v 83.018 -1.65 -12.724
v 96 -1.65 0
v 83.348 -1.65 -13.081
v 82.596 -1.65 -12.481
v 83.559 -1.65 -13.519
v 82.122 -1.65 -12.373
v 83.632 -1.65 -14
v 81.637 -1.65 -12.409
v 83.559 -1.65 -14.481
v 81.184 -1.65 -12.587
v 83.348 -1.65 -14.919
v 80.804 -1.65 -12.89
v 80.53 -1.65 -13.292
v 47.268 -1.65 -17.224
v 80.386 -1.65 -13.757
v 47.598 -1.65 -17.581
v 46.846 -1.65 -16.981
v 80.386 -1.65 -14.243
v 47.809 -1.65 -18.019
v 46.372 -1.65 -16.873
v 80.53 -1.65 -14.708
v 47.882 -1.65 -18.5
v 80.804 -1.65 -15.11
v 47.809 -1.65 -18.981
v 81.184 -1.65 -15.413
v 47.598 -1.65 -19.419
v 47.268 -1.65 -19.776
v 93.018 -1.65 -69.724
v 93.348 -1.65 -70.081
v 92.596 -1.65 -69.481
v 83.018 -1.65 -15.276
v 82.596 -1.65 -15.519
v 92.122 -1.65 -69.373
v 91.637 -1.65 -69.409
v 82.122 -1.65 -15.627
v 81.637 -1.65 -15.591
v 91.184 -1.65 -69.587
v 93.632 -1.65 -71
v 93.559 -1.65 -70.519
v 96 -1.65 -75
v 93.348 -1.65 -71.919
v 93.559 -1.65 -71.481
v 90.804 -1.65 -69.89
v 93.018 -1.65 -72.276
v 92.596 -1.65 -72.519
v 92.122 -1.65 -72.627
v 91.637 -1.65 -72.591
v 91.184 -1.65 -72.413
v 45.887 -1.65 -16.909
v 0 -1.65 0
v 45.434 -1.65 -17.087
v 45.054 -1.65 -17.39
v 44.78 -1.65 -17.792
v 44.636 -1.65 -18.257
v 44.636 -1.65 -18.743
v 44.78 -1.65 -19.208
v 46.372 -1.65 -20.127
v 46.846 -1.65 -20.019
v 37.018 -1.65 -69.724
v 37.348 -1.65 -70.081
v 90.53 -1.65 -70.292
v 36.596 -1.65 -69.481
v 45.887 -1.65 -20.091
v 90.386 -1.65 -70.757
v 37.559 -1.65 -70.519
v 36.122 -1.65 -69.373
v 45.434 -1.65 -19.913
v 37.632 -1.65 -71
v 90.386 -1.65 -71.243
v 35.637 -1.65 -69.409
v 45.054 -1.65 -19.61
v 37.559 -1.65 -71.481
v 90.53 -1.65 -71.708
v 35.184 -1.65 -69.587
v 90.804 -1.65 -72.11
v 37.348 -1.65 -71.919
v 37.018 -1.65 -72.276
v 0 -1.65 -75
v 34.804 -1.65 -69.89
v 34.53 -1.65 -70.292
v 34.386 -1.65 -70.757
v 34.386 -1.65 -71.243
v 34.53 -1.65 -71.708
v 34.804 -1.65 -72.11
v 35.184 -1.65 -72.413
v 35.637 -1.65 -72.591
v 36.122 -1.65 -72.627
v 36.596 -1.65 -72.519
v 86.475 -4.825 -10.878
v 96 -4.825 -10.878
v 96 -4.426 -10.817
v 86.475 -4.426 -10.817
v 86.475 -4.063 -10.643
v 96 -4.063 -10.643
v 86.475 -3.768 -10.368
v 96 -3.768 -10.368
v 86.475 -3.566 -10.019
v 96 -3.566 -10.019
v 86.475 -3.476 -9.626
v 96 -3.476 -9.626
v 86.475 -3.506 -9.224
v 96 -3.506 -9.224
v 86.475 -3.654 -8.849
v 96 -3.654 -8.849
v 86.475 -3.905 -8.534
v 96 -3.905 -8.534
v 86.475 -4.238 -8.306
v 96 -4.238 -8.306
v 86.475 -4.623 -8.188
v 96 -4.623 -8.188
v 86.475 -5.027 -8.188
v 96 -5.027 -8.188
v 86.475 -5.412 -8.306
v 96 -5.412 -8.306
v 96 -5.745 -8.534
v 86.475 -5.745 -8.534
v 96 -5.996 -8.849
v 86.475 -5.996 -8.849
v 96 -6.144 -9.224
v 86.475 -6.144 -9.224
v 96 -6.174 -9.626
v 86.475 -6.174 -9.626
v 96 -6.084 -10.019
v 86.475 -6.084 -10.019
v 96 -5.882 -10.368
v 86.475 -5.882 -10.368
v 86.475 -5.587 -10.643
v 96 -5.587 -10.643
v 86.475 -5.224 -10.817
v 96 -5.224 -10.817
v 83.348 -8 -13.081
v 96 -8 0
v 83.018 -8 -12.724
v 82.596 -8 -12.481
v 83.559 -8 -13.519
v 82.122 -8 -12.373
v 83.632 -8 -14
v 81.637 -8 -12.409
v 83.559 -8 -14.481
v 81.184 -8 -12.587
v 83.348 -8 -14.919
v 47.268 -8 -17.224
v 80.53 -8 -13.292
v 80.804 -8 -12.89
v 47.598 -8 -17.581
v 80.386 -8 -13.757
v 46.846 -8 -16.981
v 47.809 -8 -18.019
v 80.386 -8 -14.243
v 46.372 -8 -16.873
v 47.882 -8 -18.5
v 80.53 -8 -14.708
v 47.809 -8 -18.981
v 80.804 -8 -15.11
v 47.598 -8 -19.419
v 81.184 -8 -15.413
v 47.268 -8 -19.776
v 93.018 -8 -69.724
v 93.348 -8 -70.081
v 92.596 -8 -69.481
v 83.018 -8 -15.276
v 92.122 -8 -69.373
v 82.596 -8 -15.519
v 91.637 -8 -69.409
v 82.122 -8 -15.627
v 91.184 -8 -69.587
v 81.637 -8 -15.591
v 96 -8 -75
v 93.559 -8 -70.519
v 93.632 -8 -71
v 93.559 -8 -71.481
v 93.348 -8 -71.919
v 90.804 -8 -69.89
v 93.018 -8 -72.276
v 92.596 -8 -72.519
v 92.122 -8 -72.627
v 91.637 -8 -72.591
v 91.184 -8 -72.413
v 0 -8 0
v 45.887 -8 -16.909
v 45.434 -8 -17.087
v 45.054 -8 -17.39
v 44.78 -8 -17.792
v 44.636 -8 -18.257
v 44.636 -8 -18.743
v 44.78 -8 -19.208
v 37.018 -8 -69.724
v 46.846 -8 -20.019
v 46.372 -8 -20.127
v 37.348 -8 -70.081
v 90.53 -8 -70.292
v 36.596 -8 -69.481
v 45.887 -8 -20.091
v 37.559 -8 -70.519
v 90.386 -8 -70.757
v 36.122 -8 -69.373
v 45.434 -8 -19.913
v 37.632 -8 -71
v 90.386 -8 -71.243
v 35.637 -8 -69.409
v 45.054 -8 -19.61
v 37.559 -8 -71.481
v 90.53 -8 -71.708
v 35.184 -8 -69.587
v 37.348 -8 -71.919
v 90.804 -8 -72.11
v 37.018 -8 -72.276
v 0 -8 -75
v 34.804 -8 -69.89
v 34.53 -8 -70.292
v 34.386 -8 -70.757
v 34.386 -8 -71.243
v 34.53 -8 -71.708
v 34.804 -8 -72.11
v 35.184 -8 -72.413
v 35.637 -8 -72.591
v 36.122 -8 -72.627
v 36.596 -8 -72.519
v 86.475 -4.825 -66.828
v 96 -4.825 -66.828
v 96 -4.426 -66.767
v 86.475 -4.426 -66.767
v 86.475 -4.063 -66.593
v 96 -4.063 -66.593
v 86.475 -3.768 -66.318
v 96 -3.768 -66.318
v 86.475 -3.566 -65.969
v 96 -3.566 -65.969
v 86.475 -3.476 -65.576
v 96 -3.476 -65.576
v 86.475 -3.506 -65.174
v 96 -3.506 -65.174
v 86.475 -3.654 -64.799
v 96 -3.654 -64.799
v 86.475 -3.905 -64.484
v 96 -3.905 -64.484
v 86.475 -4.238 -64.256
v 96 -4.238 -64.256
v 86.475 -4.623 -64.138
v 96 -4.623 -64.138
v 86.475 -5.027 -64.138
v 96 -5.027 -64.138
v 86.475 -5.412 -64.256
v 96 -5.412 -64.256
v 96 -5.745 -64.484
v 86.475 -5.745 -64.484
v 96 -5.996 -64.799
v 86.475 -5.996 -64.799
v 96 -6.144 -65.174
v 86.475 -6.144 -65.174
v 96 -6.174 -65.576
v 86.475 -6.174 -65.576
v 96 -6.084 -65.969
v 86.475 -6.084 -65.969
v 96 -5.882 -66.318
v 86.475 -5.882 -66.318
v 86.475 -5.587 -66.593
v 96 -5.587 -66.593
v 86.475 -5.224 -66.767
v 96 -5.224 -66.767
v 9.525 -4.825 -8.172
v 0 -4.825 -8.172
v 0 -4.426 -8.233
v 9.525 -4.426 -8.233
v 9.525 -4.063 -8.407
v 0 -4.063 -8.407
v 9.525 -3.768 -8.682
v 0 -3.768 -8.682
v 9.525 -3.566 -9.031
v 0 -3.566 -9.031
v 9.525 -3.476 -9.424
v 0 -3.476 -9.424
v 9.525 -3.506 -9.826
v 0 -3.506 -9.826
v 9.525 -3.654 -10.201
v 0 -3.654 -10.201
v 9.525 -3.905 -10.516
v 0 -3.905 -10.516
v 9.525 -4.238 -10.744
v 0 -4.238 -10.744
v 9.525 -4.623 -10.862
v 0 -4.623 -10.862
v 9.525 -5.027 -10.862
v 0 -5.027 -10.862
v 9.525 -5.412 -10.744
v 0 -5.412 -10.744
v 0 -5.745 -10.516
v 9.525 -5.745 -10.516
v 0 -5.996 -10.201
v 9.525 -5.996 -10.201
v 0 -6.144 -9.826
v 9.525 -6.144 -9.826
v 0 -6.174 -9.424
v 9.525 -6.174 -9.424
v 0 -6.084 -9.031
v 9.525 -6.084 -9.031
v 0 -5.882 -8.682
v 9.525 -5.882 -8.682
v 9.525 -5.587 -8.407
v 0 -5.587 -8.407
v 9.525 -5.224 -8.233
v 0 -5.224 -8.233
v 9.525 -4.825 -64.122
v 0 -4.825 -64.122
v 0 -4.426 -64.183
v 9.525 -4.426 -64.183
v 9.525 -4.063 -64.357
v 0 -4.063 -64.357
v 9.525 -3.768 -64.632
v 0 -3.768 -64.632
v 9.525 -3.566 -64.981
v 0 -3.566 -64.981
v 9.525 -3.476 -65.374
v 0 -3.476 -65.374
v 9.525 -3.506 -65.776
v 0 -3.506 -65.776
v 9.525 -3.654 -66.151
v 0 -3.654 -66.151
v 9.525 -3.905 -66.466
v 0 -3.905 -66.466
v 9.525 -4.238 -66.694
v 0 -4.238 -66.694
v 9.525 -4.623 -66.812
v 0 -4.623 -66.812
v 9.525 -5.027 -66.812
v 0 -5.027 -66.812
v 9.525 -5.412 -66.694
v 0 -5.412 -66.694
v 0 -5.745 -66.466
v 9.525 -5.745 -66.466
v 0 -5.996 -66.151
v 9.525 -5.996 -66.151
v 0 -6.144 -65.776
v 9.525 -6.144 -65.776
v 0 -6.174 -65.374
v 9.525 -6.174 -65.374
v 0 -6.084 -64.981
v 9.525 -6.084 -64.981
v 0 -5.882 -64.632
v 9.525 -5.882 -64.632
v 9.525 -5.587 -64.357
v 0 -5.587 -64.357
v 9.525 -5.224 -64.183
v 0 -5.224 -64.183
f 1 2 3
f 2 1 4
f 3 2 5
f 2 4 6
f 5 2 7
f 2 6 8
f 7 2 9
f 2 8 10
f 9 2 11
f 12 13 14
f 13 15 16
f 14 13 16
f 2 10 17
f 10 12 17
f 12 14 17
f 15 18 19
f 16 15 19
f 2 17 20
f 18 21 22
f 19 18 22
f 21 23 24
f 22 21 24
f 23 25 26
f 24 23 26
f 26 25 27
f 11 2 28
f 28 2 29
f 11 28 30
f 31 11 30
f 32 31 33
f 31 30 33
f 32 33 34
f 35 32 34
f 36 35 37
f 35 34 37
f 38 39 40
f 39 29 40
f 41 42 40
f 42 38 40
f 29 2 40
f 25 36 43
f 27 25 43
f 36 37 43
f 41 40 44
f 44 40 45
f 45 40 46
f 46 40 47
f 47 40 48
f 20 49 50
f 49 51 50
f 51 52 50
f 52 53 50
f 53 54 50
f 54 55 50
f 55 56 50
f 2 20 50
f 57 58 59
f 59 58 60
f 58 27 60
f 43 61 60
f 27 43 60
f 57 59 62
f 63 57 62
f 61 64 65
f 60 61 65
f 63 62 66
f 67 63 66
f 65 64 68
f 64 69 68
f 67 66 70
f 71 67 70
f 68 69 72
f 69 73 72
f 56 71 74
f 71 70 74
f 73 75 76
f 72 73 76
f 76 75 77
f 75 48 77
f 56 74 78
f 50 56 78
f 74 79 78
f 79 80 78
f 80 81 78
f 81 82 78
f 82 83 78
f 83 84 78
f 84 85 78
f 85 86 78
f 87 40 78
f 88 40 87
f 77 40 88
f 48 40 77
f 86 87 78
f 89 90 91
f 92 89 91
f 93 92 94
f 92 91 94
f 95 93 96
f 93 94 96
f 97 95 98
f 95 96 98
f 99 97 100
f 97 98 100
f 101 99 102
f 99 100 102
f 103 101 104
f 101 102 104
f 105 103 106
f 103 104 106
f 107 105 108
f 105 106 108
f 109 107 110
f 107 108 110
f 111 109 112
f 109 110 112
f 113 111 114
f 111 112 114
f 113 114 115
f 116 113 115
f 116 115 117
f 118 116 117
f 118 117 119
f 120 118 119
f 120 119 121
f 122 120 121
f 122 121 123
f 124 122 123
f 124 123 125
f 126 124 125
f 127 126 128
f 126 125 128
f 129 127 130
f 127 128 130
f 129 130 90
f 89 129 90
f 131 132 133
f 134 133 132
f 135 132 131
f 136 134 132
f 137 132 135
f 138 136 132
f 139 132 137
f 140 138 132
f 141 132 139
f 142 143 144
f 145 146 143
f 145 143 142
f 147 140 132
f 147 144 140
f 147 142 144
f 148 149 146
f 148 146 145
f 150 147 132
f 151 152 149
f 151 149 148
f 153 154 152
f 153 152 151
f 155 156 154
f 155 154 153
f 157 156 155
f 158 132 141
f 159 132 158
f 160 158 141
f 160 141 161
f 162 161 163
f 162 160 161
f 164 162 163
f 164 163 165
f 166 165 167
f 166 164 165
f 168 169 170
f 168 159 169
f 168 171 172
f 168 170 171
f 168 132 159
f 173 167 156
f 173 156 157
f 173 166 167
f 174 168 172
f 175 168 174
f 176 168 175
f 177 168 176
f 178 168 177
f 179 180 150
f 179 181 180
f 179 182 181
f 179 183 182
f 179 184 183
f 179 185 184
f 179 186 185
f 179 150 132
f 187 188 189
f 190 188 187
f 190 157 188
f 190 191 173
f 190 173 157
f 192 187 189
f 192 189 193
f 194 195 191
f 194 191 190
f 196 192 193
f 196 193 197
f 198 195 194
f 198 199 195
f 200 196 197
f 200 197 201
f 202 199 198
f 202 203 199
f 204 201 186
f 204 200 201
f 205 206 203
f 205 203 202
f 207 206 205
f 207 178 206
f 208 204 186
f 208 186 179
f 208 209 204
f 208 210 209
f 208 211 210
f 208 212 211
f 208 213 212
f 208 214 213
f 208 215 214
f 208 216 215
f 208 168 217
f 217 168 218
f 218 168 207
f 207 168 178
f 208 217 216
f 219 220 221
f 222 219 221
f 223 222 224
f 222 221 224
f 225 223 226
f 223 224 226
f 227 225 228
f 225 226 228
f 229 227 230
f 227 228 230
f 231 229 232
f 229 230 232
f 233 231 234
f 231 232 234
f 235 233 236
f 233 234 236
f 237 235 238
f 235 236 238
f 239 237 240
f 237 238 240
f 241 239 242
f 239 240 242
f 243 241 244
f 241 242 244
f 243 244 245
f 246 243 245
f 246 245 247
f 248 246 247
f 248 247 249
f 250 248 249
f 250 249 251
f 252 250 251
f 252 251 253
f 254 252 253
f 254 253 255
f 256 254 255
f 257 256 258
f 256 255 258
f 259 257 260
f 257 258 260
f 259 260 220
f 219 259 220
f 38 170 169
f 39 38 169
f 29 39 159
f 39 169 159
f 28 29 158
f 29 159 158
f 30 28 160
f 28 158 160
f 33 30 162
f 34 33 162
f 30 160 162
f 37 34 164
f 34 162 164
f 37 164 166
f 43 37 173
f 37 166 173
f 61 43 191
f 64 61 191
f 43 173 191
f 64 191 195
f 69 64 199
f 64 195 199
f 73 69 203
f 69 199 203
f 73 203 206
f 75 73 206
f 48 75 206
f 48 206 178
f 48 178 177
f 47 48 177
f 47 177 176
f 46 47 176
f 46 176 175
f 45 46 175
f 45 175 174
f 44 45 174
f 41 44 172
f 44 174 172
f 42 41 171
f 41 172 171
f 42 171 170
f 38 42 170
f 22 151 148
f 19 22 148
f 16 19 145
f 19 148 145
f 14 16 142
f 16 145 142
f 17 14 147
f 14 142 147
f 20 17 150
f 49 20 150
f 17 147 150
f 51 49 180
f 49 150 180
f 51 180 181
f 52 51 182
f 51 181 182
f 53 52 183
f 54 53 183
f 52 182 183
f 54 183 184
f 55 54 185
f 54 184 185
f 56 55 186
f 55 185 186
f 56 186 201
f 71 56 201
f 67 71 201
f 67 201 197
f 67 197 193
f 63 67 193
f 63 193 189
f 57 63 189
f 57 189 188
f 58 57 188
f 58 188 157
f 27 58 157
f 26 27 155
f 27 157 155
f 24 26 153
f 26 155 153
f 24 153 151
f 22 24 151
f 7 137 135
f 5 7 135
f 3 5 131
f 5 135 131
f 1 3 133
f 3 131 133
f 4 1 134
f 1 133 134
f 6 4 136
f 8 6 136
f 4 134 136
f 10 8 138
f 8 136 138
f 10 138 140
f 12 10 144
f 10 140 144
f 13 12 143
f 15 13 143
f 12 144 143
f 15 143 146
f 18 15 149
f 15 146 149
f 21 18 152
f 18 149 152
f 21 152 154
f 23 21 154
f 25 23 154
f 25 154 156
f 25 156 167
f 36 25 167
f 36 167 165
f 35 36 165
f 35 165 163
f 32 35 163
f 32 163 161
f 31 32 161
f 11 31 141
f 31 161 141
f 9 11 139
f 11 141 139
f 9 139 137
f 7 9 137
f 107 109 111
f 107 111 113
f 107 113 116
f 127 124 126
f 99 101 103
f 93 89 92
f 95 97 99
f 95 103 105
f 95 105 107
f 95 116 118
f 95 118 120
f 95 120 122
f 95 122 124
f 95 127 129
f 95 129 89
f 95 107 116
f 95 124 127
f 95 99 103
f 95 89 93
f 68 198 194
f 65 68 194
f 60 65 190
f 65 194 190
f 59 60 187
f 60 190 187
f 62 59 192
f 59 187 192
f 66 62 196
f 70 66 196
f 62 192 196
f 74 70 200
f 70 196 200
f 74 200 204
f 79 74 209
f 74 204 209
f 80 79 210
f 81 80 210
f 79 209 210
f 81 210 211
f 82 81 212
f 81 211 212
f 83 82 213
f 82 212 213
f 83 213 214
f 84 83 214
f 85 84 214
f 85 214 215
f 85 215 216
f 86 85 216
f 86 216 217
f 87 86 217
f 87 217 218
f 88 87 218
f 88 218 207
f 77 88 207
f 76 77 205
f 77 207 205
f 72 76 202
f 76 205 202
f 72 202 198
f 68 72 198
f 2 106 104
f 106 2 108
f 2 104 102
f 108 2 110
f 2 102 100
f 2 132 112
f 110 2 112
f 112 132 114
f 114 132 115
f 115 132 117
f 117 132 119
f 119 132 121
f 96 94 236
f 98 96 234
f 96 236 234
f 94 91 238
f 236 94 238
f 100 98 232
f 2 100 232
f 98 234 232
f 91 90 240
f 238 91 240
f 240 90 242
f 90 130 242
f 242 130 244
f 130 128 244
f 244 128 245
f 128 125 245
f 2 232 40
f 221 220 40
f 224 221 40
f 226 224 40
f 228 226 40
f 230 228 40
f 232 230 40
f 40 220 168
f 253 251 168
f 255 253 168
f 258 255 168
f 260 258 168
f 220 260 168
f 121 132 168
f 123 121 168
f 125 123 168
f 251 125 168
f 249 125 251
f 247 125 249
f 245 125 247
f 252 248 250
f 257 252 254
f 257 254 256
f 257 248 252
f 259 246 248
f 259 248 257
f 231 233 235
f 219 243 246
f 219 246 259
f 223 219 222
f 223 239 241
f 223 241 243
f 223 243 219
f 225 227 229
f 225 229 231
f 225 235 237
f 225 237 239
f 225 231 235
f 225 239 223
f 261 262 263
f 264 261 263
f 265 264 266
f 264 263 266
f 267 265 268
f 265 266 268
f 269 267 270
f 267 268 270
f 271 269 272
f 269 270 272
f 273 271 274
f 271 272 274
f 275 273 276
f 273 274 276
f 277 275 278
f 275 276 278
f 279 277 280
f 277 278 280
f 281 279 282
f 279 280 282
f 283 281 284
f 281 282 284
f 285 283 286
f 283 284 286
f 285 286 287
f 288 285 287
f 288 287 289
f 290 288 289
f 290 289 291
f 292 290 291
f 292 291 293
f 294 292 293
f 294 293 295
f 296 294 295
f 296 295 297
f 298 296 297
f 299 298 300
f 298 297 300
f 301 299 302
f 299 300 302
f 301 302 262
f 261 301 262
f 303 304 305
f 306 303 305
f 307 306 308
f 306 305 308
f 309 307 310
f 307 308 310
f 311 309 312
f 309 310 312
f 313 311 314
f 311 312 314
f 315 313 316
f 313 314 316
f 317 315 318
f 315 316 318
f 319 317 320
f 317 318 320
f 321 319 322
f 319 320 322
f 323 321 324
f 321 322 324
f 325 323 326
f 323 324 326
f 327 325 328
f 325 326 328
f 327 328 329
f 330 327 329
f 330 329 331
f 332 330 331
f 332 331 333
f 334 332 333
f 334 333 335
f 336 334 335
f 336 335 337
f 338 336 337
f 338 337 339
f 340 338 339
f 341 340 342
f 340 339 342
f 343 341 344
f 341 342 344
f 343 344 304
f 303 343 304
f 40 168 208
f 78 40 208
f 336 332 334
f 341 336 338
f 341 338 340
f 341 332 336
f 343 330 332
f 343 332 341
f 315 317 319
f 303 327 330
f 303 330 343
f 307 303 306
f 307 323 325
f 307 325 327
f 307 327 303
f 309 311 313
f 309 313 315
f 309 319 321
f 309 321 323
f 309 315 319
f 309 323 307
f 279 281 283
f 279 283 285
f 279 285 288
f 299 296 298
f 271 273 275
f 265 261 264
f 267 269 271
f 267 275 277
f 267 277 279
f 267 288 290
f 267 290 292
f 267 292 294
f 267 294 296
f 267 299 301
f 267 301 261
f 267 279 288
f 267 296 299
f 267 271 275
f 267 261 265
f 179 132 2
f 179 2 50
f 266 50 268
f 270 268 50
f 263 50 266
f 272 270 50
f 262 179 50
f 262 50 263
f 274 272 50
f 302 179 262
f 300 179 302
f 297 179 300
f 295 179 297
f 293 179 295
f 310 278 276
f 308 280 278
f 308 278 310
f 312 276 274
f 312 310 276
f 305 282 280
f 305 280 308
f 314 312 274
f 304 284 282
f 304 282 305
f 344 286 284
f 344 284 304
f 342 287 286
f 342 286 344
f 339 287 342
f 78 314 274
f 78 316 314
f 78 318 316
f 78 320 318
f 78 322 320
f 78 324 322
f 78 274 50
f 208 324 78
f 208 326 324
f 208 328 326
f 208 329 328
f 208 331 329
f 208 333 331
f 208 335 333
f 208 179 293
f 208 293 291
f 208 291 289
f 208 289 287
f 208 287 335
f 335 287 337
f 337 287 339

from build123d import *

# Parameters (mm, degrees)
SKETCH1_W           = 96
SKETCH1_H           = 75
BOSS_EXTRUDE1_DEPTH = 6.35
SKETCH2_R           = 1.63195
CUT_EXTRUDE1_DEPTH  = 6.35
SKETCH3_R           = 1.35255
CUT_EXTRUDE2_DEPTH  = 9.525
SKETCH4_R           = 1.35255
CUT_EXTRUDE3_DEPTH  = 9.525


with BuildPart() as part:
    # Sketch1 → Boss-Extrude1 (new body)
    with BuildSketch(Plane(origin=(0, -8, 0), x_dir=(-1, 0, 0), z_dir=(0, -1, 0))):
        with Locations((-48, 37.5)):
            Rectangle(SKETCH1_W, SKETCH1_H)
    extrude(amount=-BOSS_EXTRUDE1_DEPTH)

    # Sketch2 → Cut-Extrude1 (cut)
    with BuildSketch(Plane.XZ.offset(8)):
        with Locations((36, -71)):
            Circle(SKETCH2_R)
        with Locations((46.25, -18.5)):
            Circle(SKETCH2_R)
        with Locations((82, -14)):
            Circle(SKETCH2_R)
        with Locations((92, -71)):
            Circle(SKETCH2_R)
    extrude(amount=-CUT_EXTRUDE1_DEPTH, mode=Mode.SUBTRACT)

    # Sketch3 → Cut-Extrude2 (cut)
    with BuildSketch(Plane.ZY):
        with Locations((-65.475, -4.825)):
            Circle(SKETCH3_R)
        with Locations((-9.525, -4.825)):
            Circle(SKETCH3_R)
    extrude(amount=-CUT_EXTRUDE2_DEPTH, mode=Mode.SUBTRACT)

    # Sketch4 → Cut-Extrude3 (cut)
    with BuildSketch(Plane(origin=(96, 0, 0), x_dir=(0, 0, -1), z_dir=(1, 0, 0))):
        with Locations((65.475, -4.825)):
            Circle(SKETCH4_R)
        with Locations((9.525, -4.825)):
            Circle(SKETCH4_R)
    extrude(amount=-CUT_EXTRUDE3_DEPTH, mode=Mode.SUBTRACT)


solid = part.part
